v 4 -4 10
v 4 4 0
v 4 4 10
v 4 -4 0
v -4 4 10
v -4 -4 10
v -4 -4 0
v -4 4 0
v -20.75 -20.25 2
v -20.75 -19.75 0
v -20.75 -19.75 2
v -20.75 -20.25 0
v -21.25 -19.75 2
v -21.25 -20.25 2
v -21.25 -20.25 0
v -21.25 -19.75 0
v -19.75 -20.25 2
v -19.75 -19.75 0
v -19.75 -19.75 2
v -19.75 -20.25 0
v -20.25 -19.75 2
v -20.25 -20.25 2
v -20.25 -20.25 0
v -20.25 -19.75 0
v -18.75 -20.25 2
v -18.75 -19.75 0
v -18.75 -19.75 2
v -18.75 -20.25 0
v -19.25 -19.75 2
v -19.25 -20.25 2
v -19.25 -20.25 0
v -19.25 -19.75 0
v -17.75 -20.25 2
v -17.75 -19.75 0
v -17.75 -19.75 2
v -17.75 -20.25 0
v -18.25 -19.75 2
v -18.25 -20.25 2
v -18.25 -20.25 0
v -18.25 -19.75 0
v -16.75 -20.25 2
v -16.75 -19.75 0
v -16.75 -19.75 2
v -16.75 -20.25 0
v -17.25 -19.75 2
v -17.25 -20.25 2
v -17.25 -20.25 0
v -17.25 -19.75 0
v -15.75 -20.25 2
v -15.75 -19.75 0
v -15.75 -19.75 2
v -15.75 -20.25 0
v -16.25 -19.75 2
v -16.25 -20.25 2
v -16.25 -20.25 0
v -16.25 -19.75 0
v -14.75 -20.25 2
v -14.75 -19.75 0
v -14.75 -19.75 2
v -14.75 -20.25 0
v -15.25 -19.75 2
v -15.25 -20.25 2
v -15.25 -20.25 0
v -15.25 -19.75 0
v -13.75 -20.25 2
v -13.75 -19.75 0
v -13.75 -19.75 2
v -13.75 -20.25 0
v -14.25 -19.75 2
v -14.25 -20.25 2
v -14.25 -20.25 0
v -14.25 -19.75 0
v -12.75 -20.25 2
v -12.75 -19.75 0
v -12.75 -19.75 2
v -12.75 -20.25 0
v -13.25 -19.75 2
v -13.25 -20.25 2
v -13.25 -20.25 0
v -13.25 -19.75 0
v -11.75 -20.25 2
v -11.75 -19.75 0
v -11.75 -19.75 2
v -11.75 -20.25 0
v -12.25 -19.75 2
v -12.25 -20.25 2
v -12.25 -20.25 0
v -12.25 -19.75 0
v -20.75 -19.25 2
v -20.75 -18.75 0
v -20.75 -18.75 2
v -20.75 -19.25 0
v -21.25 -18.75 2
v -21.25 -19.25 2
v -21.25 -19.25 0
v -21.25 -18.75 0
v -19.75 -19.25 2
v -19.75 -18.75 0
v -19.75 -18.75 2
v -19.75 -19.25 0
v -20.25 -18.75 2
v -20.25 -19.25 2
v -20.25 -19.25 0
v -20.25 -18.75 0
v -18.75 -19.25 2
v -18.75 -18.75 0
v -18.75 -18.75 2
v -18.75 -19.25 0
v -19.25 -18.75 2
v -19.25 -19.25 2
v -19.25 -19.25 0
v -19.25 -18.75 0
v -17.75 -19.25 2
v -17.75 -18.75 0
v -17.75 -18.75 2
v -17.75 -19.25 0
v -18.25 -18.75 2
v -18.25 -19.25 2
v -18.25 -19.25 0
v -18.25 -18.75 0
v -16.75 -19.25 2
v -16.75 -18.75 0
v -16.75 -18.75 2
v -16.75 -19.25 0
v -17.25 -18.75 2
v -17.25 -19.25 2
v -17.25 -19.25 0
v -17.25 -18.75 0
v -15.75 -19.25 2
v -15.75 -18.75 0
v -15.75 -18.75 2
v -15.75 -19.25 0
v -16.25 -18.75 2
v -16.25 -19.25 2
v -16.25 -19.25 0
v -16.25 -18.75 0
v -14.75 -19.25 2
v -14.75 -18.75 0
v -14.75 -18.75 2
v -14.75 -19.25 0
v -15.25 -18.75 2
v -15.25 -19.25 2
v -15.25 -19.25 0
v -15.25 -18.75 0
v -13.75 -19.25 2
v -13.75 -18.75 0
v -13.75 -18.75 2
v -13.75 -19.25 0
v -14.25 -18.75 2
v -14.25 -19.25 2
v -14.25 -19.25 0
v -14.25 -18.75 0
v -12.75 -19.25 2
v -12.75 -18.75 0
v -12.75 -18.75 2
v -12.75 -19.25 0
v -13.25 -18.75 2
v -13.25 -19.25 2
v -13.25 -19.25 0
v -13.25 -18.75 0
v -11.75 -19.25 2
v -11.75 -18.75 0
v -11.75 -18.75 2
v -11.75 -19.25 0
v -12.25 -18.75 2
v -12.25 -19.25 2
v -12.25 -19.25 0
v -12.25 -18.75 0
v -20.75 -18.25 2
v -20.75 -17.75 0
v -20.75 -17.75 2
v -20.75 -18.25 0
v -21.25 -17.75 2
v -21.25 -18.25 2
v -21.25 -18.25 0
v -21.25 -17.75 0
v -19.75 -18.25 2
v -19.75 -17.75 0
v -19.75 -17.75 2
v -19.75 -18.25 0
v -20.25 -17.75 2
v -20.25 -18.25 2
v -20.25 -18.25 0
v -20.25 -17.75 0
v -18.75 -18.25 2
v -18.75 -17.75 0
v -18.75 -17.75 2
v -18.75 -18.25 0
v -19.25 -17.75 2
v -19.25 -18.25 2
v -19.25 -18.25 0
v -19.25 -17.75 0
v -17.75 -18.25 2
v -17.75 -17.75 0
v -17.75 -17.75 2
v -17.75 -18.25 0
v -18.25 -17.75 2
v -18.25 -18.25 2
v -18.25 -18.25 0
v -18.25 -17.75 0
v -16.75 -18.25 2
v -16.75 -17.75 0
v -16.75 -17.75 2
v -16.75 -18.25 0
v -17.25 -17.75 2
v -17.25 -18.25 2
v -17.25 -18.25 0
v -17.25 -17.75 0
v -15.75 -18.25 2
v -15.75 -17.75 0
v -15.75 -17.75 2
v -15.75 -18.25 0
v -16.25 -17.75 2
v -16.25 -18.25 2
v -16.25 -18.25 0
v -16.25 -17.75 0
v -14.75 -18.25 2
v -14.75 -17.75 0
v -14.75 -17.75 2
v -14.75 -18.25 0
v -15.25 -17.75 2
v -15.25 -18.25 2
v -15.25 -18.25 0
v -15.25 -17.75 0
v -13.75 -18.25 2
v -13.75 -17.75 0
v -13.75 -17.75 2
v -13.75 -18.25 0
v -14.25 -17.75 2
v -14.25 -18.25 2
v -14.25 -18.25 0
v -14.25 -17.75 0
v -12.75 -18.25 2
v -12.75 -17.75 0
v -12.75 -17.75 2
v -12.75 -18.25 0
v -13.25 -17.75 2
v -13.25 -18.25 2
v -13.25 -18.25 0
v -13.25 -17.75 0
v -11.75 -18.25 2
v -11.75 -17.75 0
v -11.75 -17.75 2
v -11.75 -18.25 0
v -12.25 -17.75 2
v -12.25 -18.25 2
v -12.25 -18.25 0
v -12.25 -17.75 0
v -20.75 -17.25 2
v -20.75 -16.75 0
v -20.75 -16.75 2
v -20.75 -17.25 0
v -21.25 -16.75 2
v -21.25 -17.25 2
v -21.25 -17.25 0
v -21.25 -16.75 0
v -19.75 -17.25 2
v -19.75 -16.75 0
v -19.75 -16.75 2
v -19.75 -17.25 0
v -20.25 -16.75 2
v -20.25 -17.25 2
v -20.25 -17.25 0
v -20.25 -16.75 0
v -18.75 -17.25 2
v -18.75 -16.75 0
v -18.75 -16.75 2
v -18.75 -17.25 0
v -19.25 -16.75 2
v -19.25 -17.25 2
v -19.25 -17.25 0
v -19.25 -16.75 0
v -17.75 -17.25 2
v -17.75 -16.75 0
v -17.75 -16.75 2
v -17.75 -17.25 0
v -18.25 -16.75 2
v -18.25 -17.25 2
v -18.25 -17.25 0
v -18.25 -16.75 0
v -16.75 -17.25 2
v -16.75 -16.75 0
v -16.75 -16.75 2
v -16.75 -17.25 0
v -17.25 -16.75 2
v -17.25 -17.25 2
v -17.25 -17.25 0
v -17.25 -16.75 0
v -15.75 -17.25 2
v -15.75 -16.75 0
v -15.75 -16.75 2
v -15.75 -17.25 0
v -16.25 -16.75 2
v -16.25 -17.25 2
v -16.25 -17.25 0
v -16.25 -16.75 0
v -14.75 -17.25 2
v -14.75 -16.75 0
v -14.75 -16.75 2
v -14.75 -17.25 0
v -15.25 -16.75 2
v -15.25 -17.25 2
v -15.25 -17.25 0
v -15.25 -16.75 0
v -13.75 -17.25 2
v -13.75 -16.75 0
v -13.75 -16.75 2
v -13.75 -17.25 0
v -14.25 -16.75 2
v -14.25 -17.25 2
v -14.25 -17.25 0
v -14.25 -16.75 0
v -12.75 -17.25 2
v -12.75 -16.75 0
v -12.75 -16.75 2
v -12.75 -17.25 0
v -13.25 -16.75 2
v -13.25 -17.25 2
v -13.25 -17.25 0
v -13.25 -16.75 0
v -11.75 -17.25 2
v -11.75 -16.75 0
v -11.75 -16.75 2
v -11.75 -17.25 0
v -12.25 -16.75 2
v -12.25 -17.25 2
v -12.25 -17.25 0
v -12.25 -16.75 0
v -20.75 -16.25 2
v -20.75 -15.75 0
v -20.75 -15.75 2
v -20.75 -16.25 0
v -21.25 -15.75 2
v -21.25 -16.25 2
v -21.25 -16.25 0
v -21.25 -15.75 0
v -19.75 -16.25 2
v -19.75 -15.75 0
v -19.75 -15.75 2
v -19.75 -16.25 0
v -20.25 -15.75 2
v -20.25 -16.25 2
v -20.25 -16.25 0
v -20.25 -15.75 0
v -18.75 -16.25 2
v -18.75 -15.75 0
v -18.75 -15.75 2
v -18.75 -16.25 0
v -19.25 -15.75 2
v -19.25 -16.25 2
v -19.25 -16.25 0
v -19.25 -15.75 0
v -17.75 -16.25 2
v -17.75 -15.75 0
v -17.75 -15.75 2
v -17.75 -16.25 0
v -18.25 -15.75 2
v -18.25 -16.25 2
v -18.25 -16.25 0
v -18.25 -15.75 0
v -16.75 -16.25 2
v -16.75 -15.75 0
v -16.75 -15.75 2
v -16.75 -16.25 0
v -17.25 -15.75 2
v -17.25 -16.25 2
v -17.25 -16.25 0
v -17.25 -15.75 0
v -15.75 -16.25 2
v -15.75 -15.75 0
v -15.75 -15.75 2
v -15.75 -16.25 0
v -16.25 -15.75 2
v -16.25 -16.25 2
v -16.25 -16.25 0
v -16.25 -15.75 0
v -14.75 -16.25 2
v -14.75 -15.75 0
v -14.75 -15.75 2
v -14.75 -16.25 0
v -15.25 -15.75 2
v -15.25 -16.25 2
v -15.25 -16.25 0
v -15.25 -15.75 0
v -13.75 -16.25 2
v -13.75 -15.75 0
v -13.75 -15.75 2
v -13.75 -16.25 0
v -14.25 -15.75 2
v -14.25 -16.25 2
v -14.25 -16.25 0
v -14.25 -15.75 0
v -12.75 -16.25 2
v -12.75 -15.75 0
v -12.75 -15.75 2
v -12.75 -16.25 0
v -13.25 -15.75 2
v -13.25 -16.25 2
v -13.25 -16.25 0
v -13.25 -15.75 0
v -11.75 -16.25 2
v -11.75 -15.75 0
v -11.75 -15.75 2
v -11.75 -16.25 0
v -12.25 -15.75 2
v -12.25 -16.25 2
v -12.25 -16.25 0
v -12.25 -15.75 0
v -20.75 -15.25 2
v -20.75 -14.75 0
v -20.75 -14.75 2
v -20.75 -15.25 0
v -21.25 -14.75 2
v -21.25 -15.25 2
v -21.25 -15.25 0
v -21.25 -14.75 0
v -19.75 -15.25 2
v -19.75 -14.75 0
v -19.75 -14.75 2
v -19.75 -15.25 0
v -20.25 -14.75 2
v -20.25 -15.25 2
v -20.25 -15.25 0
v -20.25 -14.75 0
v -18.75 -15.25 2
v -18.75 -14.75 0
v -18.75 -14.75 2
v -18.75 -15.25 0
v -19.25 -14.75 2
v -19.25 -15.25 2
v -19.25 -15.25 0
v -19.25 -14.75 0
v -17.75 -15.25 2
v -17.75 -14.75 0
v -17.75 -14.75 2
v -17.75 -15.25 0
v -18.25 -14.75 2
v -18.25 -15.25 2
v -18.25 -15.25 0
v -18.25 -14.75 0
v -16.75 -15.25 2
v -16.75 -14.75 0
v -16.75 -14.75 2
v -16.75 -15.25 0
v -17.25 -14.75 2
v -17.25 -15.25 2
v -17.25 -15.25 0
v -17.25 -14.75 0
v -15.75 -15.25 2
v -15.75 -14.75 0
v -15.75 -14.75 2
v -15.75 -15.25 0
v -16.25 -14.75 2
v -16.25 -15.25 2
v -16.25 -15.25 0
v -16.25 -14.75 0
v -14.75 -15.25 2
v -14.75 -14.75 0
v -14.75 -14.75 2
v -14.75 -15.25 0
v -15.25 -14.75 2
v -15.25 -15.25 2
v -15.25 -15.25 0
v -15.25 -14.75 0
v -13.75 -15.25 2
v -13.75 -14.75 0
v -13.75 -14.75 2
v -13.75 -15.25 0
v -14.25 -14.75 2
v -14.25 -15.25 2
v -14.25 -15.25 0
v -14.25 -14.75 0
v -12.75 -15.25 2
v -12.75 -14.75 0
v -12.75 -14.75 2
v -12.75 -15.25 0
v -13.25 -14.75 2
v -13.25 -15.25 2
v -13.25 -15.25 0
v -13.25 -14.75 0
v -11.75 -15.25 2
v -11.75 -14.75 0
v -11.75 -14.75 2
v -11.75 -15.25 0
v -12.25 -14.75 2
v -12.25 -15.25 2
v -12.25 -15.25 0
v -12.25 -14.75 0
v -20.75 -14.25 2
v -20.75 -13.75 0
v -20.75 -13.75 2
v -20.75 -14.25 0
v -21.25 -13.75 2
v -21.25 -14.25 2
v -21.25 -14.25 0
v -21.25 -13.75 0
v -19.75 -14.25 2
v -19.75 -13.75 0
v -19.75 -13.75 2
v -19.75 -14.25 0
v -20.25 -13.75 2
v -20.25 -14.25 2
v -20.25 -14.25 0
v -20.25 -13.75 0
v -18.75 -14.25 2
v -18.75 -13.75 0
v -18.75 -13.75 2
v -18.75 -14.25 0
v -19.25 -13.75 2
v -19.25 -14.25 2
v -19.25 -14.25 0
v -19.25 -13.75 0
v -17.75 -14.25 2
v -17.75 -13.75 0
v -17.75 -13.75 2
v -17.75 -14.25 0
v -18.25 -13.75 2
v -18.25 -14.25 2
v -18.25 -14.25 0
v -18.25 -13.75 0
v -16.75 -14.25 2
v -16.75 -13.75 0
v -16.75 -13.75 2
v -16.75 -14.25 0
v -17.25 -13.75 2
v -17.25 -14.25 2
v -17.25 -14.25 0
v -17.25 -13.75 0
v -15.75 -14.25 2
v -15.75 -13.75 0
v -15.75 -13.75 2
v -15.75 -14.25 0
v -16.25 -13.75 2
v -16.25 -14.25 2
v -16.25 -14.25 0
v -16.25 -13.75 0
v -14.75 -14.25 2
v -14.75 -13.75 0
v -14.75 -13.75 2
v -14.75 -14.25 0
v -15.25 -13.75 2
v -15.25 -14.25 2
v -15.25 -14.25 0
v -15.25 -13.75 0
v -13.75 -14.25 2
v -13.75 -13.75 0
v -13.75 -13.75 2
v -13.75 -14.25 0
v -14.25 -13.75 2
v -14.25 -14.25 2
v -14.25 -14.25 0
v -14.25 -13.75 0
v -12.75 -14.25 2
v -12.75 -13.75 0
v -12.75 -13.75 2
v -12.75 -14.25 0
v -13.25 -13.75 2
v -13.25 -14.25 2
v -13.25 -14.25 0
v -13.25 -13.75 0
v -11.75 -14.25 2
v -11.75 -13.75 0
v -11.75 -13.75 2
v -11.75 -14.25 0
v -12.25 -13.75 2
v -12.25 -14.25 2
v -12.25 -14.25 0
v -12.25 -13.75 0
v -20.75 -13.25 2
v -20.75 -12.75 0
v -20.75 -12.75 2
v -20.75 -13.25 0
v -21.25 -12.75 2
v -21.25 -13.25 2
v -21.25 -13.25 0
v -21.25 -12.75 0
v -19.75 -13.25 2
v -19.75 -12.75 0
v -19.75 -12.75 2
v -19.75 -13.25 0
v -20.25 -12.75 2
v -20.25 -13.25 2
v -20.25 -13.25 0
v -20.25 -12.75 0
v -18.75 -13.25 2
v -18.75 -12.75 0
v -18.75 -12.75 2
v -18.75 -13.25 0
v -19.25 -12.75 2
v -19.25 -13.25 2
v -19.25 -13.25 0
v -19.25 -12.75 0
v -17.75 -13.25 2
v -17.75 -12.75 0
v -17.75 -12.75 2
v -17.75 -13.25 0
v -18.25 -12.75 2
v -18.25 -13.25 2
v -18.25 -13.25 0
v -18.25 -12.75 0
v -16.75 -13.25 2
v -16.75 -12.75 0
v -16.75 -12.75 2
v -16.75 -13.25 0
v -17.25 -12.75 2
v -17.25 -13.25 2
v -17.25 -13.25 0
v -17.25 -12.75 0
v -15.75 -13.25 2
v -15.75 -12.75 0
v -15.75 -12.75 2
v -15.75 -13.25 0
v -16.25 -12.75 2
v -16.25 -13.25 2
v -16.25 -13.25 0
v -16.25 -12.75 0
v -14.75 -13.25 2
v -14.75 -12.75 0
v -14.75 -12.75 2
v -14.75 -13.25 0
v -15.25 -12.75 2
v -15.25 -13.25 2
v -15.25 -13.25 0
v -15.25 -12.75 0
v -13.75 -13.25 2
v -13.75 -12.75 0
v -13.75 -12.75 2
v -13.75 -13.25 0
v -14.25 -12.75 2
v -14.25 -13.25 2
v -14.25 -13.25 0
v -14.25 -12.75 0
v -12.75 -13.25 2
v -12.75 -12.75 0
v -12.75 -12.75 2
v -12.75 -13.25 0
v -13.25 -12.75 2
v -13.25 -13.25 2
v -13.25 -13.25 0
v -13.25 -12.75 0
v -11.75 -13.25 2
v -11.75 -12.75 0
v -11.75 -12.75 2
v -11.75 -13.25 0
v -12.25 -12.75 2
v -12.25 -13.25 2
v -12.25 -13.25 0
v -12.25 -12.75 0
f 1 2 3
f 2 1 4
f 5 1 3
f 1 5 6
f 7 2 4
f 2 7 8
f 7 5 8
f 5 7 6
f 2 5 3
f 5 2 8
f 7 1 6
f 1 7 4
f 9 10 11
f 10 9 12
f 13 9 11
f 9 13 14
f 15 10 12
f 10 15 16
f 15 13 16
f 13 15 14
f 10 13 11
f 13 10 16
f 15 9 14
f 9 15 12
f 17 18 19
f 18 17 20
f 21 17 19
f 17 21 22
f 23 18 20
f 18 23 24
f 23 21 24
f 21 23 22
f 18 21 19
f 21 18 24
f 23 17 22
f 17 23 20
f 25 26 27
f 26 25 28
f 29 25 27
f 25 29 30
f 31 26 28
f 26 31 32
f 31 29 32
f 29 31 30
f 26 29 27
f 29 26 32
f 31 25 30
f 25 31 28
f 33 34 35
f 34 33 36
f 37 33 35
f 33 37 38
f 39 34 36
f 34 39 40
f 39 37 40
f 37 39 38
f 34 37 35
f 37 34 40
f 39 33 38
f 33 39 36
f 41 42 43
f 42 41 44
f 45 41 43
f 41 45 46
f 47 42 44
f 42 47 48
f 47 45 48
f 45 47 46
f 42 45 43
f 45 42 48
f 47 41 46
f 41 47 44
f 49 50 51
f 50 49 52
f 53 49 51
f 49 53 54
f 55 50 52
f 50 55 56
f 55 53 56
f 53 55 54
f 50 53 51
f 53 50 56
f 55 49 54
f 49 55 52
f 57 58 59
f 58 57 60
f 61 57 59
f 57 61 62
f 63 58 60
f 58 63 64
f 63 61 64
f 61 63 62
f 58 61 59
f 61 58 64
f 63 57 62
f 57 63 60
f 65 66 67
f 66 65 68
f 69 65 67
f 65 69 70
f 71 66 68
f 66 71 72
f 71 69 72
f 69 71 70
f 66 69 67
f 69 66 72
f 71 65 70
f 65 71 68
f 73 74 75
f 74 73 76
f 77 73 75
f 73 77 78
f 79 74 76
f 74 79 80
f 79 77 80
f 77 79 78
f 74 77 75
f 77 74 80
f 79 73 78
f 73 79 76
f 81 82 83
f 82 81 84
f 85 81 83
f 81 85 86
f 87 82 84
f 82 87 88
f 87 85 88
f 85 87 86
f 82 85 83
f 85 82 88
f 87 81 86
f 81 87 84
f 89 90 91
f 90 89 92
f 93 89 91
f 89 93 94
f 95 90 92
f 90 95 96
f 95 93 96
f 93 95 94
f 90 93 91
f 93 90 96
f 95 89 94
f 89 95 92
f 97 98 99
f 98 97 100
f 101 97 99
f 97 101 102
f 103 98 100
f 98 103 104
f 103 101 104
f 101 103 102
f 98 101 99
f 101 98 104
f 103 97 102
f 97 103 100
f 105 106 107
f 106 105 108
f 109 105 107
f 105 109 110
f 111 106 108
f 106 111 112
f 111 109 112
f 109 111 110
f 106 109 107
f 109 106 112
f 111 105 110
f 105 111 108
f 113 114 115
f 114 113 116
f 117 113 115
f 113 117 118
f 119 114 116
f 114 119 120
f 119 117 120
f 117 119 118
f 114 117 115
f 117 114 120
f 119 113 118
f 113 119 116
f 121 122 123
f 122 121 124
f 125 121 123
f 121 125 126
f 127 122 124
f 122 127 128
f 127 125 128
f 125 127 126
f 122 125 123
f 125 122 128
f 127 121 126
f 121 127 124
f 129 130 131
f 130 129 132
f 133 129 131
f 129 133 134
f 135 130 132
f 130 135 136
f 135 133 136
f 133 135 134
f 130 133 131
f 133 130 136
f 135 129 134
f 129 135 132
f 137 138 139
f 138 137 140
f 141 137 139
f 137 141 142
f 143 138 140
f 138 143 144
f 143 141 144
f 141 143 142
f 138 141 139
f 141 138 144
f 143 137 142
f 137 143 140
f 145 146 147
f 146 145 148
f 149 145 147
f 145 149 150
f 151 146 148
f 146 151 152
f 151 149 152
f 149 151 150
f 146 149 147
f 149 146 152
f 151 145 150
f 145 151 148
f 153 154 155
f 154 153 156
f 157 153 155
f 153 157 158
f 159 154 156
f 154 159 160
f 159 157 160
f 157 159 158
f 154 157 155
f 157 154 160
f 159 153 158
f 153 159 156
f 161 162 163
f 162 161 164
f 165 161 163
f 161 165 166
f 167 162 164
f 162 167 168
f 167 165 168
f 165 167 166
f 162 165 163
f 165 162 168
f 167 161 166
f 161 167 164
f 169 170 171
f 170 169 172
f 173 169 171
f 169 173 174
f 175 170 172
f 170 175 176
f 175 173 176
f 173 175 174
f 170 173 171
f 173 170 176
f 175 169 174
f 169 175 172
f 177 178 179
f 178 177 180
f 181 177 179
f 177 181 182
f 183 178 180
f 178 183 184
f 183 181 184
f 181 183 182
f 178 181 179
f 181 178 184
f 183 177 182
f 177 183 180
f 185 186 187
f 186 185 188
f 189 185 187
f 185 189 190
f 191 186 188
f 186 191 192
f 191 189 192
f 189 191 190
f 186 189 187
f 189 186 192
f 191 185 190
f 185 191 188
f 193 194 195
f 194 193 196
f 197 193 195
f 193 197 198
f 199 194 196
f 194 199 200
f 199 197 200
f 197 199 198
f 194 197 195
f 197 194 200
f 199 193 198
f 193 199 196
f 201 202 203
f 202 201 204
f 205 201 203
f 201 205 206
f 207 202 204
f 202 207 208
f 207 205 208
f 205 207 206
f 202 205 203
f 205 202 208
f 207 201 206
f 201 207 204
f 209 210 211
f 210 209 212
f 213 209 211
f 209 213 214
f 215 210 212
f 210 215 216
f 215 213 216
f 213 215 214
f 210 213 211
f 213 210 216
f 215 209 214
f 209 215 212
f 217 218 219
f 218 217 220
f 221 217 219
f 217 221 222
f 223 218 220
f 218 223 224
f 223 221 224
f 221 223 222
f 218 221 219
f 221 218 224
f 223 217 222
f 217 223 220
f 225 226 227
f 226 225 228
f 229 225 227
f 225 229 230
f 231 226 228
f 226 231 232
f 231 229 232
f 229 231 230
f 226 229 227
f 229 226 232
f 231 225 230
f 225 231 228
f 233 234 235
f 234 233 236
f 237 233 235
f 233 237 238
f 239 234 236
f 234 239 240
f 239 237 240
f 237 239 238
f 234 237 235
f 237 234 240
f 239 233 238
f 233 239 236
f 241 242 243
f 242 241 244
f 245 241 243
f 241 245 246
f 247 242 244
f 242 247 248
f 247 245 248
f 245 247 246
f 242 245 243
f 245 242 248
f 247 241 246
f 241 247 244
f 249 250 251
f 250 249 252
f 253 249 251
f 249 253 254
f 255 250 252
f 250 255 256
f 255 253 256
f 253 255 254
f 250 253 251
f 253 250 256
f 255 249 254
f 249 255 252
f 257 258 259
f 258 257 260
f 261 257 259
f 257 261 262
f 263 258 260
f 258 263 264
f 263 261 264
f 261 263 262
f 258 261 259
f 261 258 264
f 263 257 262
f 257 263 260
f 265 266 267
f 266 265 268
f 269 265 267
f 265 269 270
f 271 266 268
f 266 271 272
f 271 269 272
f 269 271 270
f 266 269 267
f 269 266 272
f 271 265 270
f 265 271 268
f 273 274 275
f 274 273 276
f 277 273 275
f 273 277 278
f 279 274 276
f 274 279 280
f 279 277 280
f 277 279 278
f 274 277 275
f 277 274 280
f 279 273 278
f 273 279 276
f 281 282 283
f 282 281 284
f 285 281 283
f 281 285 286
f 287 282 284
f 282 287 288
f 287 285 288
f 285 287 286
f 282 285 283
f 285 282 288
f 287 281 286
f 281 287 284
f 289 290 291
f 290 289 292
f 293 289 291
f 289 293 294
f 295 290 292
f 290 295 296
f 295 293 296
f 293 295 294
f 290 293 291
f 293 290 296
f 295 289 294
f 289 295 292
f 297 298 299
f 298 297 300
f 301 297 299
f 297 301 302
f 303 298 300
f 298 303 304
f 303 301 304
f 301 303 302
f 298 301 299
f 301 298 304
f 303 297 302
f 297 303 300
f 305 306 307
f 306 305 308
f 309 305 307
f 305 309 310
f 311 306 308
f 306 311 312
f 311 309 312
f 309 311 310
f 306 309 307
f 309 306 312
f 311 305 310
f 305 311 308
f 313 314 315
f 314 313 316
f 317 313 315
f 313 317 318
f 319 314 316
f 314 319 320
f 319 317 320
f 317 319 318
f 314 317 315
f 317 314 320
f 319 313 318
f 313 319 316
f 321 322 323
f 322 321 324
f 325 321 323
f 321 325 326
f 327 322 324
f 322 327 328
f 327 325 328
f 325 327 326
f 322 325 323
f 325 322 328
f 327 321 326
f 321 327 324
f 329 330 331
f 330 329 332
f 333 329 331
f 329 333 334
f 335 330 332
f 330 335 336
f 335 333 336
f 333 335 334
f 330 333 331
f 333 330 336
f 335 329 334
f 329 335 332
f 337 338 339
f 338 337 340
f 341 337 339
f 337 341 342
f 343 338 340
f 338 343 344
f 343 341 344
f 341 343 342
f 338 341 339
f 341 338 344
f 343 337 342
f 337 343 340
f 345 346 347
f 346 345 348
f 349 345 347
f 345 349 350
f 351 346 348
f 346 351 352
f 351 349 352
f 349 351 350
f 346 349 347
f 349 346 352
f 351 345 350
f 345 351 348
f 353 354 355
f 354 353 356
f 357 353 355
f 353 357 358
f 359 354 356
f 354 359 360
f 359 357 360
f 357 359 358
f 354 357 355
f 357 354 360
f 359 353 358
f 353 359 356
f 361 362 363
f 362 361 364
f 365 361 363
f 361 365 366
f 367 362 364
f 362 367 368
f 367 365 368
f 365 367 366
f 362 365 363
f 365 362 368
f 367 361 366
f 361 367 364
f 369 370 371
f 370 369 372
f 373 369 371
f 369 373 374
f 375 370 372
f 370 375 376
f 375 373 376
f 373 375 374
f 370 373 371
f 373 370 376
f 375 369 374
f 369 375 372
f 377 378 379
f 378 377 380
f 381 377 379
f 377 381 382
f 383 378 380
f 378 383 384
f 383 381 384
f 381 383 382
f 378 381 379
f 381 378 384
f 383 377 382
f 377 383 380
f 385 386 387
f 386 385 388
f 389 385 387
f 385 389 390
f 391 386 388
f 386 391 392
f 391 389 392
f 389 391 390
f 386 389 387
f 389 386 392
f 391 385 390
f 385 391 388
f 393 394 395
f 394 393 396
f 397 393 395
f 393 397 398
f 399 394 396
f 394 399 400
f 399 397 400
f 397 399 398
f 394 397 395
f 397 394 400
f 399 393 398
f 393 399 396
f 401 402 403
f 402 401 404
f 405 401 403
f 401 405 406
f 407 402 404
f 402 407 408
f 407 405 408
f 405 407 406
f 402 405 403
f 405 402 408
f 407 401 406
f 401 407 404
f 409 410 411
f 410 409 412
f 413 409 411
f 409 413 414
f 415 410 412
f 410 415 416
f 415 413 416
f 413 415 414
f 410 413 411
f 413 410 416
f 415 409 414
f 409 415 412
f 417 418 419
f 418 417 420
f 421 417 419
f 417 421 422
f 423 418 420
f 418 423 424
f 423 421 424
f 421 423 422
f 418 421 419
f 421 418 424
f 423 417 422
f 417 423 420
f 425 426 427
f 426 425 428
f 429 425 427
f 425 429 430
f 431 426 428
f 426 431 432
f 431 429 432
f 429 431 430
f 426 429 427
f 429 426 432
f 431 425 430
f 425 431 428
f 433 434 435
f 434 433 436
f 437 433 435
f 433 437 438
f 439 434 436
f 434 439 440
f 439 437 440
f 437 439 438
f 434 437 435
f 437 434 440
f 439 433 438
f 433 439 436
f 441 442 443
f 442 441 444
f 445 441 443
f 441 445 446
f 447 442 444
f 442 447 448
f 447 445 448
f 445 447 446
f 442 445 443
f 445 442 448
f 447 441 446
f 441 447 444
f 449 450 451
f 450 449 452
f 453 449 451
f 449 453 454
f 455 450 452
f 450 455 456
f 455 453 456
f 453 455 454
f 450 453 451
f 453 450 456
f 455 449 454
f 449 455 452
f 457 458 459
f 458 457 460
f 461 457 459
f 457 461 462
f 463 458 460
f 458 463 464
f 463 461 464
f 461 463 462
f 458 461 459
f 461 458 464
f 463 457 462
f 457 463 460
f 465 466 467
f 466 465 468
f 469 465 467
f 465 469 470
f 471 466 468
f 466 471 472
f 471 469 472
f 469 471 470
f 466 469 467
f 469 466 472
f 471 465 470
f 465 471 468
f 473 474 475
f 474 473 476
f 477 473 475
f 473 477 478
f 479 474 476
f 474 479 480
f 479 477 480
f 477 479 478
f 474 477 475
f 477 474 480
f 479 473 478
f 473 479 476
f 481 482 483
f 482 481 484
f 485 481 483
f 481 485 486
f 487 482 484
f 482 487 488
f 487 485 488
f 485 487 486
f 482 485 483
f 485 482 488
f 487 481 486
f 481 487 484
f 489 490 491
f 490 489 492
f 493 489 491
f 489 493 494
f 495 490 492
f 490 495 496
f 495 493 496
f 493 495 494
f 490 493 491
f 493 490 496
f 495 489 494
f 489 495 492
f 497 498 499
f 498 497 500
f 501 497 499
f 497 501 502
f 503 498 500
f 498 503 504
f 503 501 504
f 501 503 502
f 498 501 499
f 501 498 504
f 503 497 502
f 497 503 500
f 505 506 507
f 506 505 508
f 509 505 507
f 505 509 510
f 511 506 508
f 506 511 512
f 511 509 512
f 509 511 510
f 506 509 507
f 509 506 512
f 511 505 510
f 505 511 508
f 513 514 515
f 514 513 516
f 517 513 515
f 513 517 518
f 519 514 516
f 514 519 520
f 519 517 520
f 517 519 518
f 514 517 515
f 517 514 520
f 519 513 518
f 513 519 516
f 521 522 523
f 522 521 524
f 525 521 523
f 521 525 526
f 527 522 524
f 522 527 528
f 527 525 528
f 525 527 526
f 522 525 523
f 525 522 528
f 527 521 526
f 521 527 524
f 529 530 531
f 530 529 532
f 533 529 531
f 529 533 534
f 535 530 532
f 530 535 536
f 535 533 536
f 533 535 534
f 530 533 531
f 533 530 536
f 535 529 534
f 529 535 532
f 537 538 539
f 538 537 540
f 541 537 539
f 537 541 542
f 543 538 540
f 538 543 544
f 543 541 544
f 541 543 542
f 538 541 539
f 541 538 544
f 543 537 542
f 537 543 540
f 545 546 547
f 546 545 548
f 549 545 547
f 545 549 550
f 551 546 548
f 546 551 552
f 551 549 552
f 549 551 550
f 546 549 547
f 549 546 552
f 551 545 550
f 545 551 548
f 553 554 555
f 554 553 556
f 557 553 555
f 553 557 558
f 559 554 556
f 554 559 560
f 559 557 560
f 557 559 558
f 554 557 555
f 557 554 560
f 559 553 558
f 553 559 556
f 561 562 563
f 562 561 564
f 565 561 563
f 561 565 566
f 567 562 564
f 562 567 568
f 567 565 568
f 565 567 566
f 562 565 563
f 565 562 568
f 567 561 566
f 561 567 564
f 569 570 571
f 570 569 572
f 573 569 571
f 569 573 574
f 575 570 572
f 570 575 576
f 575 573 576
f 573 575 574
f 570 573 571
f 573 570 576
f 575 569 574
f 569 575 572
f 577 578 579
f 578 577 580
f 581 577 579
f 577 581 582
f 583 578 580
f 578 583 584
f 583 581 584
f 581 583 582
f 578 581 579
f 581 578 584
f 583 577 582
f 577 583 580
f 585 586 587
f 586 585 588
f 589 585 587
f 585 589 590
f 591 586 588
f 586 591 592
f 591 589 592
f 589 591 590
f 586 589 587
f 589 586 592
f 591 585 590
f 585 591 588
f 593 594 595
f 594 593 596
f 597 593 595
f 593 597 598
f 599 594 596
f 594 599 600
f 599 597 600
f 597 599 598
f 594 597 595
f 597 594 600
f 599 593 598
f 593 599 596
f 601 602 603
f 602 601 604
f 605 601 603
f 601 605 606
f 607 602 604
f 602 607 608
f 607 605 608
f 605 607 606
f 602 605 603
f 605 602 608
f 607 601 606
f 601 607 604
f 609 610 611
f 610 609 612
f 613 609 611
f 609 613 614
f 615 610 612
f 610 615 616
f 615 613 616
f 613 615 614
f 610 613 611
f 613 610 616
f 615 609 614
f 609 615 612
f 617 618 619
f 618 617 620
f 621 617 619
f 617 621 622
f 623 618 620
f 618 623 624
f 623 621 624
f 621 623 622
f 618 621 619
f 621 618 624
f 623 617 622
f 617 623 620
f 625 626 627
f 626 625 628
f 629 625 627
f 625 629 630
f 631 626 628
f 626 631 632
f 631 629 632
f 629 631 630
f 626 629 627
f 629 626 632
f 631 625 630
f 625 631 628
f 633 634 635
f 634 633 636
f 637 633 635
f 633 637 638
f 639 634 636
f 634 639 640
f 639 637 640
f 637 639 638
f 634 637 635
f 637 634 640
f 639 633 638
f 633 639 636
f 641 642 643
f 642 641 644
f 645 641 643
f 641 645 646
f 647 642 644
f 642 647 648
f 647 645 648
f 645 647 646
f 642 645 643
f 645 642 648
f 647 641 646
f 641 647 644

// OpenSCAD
translate([0, 0, 5]) color([0,1,0,0.9]) cube([8, 8, 10], center=true);
translate([-21.0, -20.0, 1]) color([1,0,0]) cube([0.5, 0.5, 2], center=true);
translate([-20.0, -20.0, 1]) color([1,0,0]) cube([0.5, 0.5, 2], center=true);
translate([-19.0, -20.0, 1]) color([1,0,0]) cube([0.5, 0.5, 2], center=true);
translate([-18.0, -20.0, 1]) color([1,0,0]) cube([0.5, 0.5, 2], center=true);
translate([-17.0, -20.0, 1]) color([1,0,0]) cube([0.5, 0.5, 2], center=true);
translate([-16.0, -20.0, 1]) color([1,0,0]) cube([0.5, 0.5, 2], center=true);
translate([-15.0, -20.0, 1]) color([1,0,0]) cube([0.5, 0.5, 2], center=true);
translate([-14.0, -20.0, 1]) color([1,0,0]) cube([0.5, 0.5, 2], center=true);
translate([-13.0, -20.0, 1]) color([1,0,0]) cube([0.5, 0.5, 2], center=true);
translate([-12.0, -20.0, 1]) color([1,0,0]) cube([0.5, 0.5, 2], center=true);
translate([-21.0, -19.0, 1]) color([1,0,0]) cube([0.5, 0.5, 2], center=true);
translate([-20.0, -19.0, 1]) color([1,0,0]) cube([0.5, 0.5, 2], center=true);
translate([-19.0, -19.0, 1]) color([1,0,0]) cube([0.5, 0.5, 2], center=true);
translate([-18.0, -19.0, 1]) color([1,0,0]) cube([0.5, 0.5, 2], center=true);
translate([-17.0, -19.0, 1]) color([1,0,0]) cube([0.5, 0.5, 2], center=true);
translate([-16.0, -19.0, 1]) color([1,0,0]) cube([0.5, 0.5, 2], center=true);
translate([-15.0, -19.0, 1]) color([1,0,0]) cube([0.5, 0.5, 2], center=true);
translate([-14.0, -19.0, 1]) color([1,0,0]) cube([0.5, 0.5, 2], center=true);
translate([-13.0, -19.0, 1]) color([1,0,0]) cube([0.5, 0.5, 2], center=true);
translate([-12.0, -19.0, 1]) color([1,0,0]) cube([0.5, 0.5, 2], center=true);
translate([-21.0, -18.0, 1]) color([1,0,0]) cube([0.5, 0.5, 2], center=true);
translate([-20.0, -18.0, 1]) color([1,0,0]) cube([0.5, 0.5, 2], center=true);
translate([-19.0, -18.0, 1]) color([1,0,0]) cube([0.5, 0.5, 2], center=true);
translate([-18.0, -18.0, 1]) color([1,0,0]) cube([0.5, 0.5, 2], center=true);
translate([-17.0, -18.0, 1]) color([1,0,0]) cube([0.5, 0.5, 2], center=true);
translate([-16.0, -18.0, 1]) color([1,0,0]) cube([0.5, 0.5, 2], center=true);
translate([-15.0, -18.0, 1]) color([1,0,0]) cube([0.5, 0.5, 2], center=true);
translate([-14.0, -18.0, 1]) color([1,0,0]) cube([0.5, 0.5, 2], center=true);
translate([-13.0, -18.0, 1]) color([1,0,0]) cube([0.5, 0.5, 2], center=true);
translate([-12.0, -18.0, 1]) color([1,0,0]) cube([0.5, 0.5, 2], center=true);
translate([-21.0, -17.0, 1]) color([1,0,0]) cube([0.5, 0.5, 2], center=true);
translate([-20.0, -17.0, 1]) color([1,0,0]) cube([0.5, 0.5, 2], center=true);
translate([-19.0, -17.0, 1]) color([1,0,0]) cube([0.5, 0.5, 2], center=true);
translate([-18.0, -17.0, 1]) color([1,0,0]) cube([0.5, 0.5, 2], center=true);
translate([-17.0, -17.0, 1]) color([1,0,0]) cube([0.5, 0.5, 2], center=true);
translate([-16.0, -17.0, 1]) color([1,0,0]) cube([0.5, 0.5, 2], center=true);
translate([-15.0, -17.0, 1]) color([1,0,0]) cube([0.5, 0.5, 2], center=true);
translate([-14.0, -17.0, 1]) color([1,0,0]) cube([0.5, 0.5, 2], center=true);
translate([-13.0, -17.0, 1]) color([1,0,0]) cube([0.5, 0.5, 2], center=true);
translate([-12.0, -17.0, 1]) color([1,0,0]) cube([0.5, 0.5, 2], center=true);
translate([-21.0, -16.0, 1]) color([1,0,0]) cube([0.5, 0.5, 2], center=true);
translate([-20.0, -16.0, 1]) color([1,0,0]) cube([0.5, 0.5, 2], center=true);
translate([-19.0, -16.0, 1]) color([1,0,0]) cube([0.5, 0.5, 2], center=true);
translate([-18.0, -16.0, 1]) color([1,0,0]) cube([0.5, 0.5, 2], center=true);
translate([-17.0, -16.0, 1]) color([1,0,0]) cube([0.5, 0.5, 2], center=true);
translate([-16.0, -16.0, 1]) color([1,0,0]) cube([0.5, 0.5, 2], center=true);
translate([-15.0, -16.0, 1]) color([1,0,0]) cube([0.5, 0.5, 2], center=true);
translate([-14.0, -16.0, 1]) color([1,0,0]) cube([0.5, 0.5, 2], center=true);
translate([-13.0, -16.0, 1]) color([1,0,0]) cube([0.5, 0.5, 2], center=true);
translate([-12.0, -16.0, 1]) color([1,0,0]) cube([0.5, 0.5, 2], center=true);
translate([-21.0, -15.0, 1]) color([1,0,0]) cube([0.5, 0.5, 2], center=true);
translate([-20.0, -15.0, 1]) color([1,0,0]) cube([0.5, 0.5, 2], center=true);
translate([-19.0, -15.0, 1]) color([1,0,0]) cube([0.5, 0.5, 2], center=true);
translate([-18.0, -15.0, 1]) color([1,0,0]) cube([0.5, 0.5, 2], center=true);
translate([-17.0, -15.0, 1]) color([1,0,0]) cube([0.5, 0.5, 2], center=true);
translate([-16.0, -15.0, 1]) color([1,0,0]) cube([0.5, 0.5, 2], center=true);
translate([-15.0, -15.0, 1]) color([1,0,0]) cube([0.5, 0.5, 2], center=true);
translate([-14.0, -15.0, 1]) color([1,0,0]) cube([0.5, 0.5, 2], center=true);
translate([-13.0, -15.0, 1]) color([1,0,0]) cube([0.5, 0.5, 2], center=true);
translate([-12.0, -15.0, 1]) color([1,0,0]) cube([0.5, 0.5, 2], center=true);
translate([-21.0, -14.0, 1]) color([1,0,0]) cube([0.5, 0.5, 2], center=true);
translate([-20.0, -14.0, 1]) color([1,0,0]) cube([0.5, 0.5, 2], center=true);
translate([-19.0, -14.0, 1]) color([1,0,0]) cube([0.5, 0.5, 2], center=true);
translate([-18.0, -14.0, 1]) color([1,0,0]) cube([0.5, 0.5, 2], center=true);
translate([-17.0, -14.0, 1]) color([1,0,0]) cube([0.5, 0.5, 2], center=true);
translate([-16.0, -14.0, 1]) color([1,0,0]) cube([0.5, 0.5, 2], center=true);
translate([-15.0, -14.0, 1]) color([1,0,0]) cube([0.5, 0.5, 2], center=true);
translate([-14.0, -14.0, 1]) color([1,0,0]) cube([0.5, 0.5, 2], center=true);
translate([-13.0, -14.0, 1]) color([1,0,0]) cube([0.5, 0.5, 2], center=true);
translate([-12.0, -14.0, 1]) color([1,0,0]) cube([0.5, 0.5, 2], center=true);
translate([-21.0, -13.0, 1]) color([1,0,0]) cube([0.5, 0.5, 2], center=true);
translate([-20.0, -13.0, 1]) color([1,0,0]) cube([0.5, 0.5, 2], center=true);
translate([-19.0, -13.0, 1]) color([1,0,0]) cube([0.5, 0.5, 2], center=true);
translate([-18.0, -13.0, 1]) color([1,0,0]) cube([0.5, 0.5, 2], center=true);
translate([-17.0, -13.0, 1]) color([1,0,0]) cube([0.5, 0.5, 2], center=true);
translate([-16.0, -13.0, 1]) color([1,0,0]) cube([0.5, 0.5, 2], center=true);
translate([-15.0, -13.0, 1]) color([1,0,0]) cube([0.5, 0.5, 2], center=true);
translate([-14.0, -13.0, 1]) color([1,0,0]) cube([0.5, 0.5, 2], center=true);
translate([-13.0, -13.0, 1]) color([1,0,0]) cube([0.5, 0.5, 2], center=true);
translate([-12.0, -13.0, 1]) color([1,0,0]) cube([0.5, 0.5, 2], center=true);
